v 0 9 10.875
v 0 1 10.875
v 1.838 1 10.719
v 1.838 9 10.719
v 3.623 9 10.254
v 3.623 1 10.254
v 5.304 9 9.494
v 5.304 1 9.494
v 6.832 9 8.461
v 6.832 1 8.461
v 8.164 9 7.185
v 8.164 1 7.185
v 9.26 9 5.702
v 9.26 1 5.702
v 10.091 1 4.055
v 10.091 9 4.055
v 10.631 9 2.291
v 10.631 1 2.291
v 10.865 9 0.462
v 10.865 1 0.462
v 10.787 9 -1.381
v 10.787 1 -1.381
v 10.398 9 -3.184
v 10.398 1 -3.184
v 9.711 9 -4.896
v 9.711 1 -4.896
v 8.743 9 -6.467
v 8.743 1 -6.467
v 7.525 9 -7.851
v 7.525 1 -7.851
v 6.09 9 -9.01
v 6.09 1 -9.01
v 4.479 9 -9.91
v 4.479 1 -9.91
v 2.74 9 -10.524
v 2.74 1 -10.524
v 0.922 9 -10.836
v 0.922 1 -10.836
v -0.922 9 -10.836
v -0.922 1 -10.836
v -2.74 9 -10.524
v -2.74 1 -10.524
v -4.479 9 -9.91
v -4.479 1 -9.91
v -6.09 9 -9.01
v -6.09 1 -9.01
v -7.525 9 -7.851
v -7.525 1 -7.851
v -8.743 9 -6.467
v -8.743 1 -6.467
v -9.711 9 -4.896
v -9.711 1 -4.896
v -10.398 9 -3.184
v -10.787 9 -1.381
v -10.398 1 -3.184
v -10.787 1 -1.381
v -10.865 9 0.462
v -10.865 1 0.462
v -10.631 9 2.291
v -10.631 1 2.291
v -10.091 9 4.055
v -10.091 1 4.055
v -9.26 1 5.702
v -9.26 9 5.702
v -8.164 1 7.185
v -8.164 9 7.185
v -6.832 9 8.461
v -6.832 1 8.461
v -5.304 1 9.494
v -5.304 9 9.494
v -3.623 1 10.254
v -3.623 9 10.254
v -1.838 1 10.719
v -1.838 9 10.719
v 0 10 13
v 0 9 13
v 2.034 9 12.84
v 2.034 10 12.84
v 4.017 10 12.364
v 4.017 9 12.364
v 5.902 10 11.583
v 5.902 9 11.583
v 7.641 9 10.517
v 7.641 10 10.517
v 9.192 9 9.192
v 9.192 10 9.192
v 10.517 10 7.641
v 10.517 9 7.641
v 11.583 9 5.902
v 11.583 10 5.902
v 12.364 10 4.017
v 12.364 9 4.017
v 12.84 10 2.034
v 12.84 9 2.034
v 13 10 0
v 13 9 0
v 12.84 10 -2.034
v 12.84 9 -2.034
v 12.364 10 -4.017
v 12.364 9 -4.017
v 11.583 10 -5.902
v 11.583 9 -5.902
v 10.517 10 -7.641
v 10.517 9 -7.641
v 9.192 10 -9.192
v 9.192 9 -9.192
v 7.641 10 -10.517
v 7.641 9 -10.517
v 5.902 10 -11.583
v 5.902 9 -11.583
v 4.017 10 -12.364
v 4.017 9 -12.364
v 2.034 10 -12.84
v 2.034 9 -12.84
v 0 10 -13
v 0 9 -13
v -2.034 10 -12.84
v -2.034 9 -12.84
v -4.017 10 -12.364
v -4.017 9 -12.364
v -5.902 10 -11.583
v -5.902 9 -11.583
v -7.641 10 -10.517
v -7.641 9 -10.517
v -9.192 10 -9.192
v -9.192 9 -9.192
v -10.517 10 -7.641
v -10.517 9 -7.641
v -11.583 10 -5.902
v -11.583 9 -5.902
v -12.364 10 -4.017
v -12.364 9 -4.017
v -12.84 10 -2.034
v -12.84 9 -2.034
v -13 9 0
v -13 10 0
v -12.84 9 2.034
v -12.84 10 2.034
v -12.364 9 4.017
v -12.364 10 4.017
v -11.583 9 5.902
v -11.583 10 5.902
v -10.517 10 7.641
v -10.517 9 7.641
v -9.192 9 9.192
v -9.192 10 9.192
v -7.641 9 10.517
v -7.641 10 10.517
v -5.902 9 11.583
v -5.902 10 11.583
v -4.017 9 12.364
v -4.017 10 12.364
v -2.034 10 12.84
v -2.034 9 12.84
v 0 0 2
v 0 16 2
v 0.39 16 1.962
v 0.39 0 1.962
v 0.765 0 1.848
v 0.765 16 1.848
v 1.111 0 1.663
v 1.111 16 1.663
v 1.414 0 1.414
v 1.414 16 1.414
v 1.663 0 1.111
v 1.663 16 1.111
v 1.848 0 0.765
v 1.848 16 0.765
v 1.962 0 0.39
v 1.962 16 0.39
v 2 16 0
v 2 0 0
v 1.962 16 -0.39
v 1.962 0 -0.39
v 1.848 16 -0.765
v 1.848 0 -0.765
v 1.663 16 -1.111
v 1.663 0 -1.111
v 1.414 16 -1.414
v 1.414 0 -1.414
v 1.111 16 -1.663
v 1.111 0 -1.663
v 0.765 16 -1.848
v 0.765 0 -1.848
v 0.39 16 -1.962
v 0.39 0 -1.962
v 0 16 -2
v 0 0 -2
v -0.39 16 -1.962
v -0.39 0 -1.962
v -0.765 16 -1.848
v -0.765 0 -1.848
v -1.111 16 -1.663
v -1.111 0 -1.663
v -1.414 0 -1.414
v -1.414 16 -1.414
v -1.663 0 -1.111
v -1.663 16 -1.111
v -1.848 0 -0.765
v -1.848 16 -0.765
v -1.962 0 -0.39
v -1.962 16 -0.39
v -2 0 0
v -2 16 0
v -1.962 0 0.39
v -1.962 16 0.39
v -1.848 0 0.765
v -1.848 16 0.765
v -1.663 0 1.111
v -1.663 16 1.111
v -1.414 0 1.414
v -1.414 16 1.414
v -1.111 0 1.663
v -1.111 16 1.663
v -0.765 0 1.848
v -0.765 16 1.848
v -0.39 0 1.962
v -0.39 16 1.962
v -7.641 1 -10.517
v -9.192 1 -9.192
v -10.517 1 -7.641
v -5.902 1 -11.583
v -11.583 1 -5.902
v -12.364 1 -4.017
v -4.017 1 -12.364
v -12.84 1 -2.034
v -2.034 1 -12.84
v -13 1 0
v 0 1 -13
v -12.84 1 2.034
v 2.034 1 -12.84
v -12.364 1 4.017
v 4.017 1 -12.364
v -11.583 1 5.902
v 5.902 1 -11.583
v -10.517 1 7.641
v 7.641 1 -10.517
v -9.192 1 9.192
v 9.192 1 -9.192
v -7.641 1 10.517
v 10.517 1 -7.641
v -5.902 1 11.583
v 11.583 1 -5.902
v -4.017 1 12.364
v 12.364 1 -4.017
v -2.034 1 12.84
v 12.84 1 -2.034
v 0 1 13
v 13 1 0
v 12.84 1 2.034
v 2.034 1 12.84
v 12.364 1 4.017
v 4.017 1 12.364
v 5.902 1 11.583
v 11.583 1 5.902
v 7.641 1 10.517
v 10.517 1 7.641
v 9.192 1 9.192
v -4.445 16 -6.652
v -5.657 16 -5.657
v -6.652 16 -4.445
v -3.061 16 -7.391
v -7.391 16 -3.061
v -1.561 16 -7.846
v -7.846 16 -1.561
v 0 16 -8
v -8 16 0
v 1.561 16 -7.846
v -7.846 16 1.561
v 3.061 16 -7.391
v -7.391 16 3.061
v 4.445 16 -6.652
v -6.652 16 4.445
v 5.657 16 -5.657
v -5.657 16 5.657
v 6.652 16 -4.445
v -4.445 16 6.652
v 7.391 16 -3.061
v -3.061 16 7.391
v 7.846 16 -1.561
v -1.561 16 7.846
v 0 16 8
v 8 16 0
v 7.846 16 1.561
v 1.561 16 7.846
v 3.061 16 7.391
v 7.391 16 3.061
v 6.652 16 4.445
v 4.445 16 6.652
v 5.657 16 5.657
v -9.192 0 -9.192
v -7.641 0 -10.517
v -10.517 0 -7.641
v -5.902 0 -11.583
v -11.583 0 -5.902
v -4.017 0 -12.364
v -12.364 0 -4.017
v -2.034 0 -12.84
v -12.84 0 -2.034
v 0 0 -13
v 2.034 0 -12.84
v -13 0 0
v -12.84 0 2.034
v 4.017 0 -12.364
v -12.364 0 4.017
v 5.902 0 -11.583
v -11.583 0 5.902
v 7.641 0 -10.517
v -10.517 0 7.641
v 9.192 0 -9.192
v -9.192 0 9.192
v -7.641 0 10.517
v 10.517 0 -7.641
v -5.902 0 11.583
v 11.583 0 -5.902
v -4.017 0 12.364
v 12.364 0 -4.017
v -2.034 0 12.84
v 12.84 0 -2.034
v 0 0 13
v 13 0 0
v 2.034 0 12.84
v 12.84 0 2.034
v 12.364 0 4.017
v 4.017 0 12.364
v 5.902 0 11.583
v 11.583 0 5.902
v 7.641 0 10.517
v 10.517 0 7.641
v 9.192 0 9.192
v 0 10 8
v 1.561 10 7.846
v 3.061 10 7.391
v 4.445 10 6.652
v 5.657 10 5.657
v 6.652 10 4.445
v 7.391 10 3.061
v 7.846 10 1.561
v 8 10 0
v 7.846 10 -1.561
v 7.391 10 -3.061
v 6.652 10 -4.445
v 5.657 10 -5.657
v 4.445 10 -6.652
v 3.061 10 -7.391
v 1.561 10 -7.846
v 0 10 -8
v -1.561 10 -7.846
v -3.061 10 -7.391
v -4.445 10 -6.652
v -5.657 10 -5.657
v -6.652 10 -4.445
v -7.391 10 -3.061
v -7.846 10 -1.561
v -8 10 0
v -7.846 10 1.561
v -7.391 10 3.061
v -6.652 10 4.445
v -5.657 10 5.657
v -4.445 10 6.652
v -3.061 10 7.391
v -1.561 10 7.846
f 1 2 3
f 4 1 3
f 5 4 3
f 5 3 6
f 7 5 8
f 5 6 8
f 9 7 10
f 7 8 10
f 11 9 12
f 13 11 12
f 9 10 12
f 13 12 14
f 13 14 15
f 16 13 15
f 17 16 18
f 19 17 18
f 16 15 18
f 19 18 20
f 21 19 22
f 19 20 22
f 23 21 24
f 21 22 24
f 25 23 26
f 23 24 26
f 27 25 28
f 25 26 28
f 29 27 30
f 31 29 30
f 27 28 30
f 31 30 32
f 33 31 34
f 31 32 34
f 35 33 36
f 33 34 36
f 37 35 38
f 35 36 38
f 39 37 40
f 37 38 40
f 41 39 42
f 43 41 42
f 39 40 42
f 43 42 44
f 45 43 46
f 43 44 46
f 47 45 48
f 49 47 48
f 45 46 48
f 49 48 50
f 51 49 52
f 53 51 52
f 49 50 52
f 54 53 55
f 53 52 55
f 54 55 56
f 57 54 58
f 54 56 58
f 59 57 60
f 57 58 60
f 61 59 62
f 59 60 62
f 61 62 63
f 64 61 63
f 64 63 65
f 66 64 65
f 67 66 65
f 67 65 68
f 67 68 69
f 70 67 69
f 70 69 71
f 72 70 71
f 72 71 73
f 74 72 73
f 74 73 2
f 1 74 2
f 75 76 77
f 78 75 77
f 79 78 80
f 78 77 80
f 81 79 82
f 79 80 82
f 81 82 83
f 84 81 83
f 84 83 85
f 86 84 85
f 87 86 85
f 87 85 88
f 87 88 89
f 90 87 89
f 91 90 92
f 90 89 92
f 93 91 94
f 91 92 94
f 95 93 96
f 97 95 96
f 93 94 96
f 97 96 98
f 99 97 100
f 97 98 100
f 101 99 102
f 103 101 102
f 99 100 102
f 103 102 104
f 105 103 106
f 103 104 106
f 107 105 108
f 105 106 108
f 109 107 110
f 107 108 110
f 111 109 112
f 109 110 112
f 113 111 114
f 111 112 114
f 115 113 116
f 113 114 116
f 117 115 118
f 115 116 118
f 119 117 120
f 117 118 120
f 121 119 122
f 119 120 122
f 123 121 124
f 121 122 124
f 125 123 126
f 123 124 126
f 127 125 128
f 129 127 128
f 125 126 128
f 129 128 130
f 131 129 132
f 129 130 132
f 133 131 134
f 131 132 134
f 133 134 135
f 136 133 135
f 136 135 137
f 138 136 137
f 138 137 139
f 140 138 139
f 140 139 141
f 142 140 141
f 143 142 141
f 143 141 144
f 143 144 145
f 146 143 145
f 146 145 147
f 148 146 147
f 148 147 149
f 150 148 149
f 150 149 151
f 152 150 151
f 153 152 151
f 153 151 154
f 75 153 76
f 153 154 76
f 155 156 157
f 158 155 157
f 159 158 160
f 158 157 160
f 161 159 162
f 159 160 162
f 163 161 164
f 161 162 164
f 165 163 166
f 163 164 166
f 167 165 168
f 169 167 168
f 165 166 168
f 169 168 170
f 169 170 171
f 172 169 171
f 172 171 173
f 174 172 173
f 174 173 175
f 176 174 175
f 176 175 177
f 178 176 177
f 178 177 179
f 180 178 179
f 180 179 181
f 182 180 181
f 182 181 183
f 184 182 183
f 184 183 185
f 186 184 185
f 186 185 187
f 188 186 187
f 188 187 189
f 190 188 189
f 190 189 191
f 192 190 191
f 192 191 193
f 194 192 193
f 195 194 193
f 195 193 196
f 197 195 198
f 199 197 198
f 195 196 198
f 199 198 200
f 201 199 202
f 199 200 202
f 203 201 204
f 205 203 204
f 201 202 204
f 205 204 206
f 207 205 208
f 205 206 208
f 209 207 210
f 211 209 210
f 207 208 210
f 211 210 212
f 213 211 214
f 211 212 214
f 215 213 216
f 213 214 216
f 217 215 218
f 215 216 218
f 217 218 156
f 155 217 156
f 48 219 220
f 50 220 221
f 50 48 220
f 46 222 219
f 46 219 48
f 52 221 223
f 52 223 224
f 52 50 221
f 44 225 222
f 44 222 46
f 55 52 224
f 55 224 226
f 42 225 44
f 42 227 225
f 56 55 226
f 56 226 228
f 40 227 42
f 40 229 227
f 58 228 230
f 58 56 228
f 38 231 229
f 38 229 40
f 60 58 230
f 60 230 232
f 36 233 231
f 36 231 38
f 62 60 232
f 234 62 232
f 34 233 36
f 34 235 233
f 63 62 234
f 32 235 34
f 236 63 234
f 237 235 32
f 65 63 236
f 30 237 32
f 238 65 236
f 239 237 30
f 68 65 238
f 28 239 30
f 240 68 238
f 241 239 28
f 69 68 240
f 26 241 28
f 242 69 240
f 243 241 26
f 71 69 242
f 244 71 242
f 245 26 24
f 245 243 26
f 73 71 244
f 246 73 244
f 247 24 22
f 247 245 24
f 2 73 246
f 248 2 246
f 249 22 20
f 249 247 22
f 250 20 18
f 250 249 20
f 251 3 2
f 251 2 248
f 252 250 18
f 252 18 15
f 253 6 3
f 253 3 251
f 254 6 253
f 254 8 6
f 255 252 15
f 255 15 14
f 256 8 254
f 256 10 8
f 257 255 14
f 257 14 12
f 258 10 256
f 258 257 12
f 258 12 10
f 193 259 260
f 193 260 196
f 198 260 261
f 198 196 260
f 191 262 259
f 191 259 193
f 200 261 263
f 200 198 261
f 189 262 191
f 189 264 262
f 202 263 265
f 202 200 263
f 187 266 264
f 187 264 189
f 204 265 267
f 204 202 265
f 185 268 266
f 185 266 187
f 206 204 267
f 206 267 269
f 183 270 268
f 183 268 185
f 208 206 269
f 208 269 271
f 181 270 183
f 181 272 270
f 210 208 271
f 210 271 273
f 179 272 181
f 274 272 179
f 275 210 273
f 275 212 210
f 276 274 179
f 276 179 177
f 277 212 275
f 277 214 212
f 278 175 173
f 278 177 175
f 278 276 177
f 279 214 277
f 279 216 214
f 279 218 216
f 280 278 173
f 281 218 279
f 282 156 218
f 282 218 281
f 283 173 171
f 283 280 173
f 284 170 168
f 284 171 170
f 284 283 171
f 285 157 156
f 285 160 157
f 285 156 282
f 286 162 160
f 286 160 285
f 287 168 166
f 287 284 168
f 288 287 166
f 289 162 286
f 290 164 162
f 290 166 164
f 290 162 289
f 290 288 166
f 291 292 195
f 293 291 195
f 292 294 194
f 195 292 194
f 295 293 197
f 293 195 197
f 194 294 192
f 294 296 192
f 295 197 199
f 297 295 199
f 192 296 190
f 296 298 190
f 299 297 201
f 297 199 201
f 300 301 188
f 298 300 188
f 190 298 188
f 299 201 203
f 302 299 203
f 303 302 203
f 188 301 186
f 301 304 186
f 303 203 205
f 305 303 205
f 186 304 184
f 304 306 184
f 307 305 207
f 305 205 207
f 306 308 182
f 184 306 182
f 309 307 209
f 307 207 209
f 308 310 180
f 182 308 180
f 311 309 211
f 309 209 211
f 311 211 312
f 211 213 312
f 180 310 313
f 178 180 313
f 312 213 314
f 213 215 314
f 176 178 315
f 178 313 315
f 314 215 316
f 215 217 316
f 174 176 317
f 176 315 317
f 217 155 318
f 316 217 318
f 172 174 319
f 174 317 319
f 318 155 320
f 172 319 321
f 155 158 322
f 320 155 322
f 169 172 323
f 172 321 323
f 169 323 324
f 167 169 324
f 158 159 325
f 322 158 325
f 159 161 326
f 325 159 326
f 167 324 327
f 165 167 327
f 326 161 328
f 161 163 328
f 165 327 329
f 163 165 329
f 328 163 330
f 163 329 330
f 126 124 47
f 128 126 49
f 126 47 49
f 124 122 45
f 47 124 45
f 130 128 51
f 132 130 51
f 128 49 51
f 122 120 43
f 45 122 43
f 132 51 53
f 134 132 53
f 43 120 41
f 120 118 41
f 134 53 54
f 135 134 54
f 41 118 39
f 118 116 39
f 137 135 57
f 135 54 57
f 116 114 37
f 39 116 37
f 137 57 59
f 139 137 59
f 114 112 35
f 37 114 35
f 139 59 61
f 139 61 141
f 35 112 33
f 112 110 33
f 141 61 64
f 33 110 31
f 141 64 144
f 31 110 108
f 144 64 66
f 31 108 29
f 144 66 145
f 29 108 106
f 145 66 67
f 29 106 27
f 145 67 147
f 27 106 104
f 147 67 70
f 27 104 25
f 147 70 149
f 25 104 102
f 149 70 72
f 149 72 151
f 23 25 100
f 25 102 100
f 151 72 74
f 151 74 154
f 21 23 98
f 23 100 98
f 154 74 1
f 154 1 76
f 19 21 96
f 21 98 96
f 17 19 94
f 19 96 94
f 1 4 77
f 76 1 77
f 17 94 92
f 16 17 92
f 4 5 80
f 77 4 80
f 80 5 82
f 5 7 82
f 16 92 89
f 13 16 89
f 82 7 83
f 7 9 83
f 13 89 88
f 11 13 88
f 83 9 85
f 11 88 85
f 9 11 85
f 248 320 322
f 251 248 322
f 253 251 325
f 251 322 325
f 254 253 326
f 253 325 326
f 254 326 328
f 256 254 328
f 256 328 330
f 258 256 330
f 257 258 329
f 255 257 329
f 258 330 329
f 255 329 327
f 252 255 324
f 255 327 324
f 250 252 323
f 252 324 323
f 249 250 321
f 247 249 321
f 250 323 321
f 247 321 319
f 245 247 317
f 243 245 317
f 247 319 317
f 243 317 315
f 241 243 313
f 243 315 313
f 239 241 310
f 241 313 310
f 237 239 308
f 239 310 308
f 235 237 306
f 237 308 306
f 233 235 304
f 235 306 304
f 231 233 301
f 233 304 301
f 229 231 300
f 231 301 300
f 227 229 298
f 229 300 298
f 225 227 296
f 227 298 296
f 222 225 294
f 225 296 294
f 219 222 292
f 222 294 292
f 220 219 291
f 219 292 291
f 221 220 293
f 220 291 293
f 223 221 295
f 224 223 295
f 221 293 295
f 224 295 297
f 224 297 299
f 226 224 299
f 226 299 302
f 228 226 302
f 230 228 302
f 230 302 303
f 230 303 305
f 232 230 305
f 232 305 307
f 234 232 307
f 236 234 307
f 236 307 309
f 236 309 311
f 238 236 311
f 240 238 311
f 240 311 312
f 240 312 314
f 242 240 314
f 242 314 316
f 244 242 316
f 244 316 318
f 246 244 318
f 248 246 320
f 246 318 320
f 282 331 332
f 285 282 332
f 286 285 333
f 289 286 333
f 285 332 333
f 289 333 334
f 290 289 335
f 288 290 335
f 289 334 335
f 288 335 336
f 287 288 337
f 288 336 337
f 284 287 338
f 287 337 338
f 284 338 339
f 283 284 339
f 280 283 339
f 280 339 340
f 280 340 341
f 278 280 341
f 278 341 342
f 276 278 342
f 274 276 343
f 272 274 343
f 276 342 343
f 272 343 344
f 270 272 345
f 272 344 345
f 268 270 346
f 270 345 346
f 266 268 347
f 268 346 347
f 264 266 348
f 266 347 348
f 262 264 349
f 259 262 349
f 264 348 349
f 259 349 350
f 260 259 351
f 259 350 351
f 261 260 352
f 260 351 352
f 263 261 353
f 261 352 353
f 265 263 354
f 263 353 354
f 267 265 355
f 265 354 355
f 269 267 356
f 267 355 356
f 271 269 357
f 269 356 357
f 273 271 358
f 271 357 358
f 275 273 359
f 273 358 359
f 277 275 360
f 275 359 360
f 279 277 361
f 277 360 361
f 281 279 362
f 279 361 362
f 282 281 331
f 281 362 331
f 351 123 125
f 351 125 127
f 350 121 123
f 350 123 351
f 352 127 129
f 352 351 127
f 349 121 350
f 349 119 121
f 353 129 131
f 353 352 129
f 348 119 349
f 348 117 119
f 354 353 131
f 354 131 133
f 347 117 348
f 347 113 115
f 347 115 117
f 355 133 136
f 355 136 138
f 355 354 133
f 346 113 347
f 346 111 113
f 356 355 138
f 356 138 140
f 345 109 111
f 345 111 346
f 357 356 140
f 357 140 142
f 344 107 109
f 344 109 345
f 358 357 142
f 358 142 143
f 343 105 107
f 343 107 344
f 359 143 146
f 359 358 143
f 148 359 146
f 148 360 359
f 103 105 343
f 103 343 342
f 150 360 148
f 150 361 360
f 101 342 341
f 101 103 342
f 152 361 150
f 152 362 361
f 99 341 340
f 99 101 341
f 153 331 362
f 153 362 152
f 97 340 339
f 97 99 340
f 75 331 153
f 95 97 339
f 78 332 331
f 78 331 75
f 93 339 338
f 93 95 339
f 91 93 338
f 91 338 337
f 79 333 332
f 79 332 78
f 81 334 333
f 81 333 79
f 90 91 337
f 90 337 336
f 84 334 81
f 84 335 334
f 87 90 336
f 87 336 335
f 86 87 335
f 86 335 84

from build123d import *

# Parameters (mm, degrees)
ESQUISSE1_R      = 13
EXTRUSION1_DEPTH = 1
ESQUISSE2_R      = 10.875
EXTRUSION2_DEPTH = 8
ESQUISSE3_R      = 13
EXTRUSION3_DEPTH = 1
ESQUISSE4_R      = 8
EXTRUSION4_DEPTH = 6
ESQUISSE5_R      = 2
EXTRUSION5_DEPTH = 25.372115214


with BuildPart() as part:
    # Esquisse1 → Extrusion1 (new body)
    with BuildSketch(Plane(origin=(0, 0, 0), x_dir=(1, 0, 0), z_dir=(0, 1, 0))):
        with Locations(Location((0, 0, 0), (0, 0, 270))):
            Circle(ESQUISSE1_R)
    extrude(amount=EXTRUSION1_DEPTH)

    # Esquisse2 → Extrusion2 (add)
    with BuildSketch(Plane(origin=(0, 1, 0), x_dir=(-1, 0, 0), z_dir=(0, 1, 0))):
        with Locations(Location((0, 0, 0), (0, 0, 90))):
            Circle(ESQUISSE2_R)
    extrude(amount=EXTRUSION2_DEPTH)

    # Esquisse3 → Extrusion3 (add)
    with BuildSketch(Plane(origin=(0, 9, 0), x_dir=(-1, 0, 0), z_dir=(0, 1, 0))):
        with Locations(Location((0, 0, 0), (0, 0, 90))):
            Circle(ESQUISSE3_R)
    extrude(amount=EXTRUSION3_DEPTH)

    # Esquisse4 → Extrusion4 (add)
    with BuildSketch(Plane(origin=(0, 10, 0), x_dir=(-1, 0, 0), z_dir=(0, 1, 0))):
        with Locations(Location((0, 0, 0), (0, 0, 90))):
            Circle(ESQUISSE4_R)
    extrude(amount=EXTRUSION4_DEPTH)

    # Esquisse5 → Extrusion5 (cut, through all)
    with BuildSketch(Plane(origin=(0, 16, 0), x_dir=(-1, 0, 0), z_dir=(0, 1, 0))):
        with Locations(Location((0, 0, 0), (0, 0, 90))):
            Circle(ESQUISSE5_R)
    extrude(amount=-EXTRUSION5_DEPTH, mode=Mode.SUBTRACT)


solid = part.part
